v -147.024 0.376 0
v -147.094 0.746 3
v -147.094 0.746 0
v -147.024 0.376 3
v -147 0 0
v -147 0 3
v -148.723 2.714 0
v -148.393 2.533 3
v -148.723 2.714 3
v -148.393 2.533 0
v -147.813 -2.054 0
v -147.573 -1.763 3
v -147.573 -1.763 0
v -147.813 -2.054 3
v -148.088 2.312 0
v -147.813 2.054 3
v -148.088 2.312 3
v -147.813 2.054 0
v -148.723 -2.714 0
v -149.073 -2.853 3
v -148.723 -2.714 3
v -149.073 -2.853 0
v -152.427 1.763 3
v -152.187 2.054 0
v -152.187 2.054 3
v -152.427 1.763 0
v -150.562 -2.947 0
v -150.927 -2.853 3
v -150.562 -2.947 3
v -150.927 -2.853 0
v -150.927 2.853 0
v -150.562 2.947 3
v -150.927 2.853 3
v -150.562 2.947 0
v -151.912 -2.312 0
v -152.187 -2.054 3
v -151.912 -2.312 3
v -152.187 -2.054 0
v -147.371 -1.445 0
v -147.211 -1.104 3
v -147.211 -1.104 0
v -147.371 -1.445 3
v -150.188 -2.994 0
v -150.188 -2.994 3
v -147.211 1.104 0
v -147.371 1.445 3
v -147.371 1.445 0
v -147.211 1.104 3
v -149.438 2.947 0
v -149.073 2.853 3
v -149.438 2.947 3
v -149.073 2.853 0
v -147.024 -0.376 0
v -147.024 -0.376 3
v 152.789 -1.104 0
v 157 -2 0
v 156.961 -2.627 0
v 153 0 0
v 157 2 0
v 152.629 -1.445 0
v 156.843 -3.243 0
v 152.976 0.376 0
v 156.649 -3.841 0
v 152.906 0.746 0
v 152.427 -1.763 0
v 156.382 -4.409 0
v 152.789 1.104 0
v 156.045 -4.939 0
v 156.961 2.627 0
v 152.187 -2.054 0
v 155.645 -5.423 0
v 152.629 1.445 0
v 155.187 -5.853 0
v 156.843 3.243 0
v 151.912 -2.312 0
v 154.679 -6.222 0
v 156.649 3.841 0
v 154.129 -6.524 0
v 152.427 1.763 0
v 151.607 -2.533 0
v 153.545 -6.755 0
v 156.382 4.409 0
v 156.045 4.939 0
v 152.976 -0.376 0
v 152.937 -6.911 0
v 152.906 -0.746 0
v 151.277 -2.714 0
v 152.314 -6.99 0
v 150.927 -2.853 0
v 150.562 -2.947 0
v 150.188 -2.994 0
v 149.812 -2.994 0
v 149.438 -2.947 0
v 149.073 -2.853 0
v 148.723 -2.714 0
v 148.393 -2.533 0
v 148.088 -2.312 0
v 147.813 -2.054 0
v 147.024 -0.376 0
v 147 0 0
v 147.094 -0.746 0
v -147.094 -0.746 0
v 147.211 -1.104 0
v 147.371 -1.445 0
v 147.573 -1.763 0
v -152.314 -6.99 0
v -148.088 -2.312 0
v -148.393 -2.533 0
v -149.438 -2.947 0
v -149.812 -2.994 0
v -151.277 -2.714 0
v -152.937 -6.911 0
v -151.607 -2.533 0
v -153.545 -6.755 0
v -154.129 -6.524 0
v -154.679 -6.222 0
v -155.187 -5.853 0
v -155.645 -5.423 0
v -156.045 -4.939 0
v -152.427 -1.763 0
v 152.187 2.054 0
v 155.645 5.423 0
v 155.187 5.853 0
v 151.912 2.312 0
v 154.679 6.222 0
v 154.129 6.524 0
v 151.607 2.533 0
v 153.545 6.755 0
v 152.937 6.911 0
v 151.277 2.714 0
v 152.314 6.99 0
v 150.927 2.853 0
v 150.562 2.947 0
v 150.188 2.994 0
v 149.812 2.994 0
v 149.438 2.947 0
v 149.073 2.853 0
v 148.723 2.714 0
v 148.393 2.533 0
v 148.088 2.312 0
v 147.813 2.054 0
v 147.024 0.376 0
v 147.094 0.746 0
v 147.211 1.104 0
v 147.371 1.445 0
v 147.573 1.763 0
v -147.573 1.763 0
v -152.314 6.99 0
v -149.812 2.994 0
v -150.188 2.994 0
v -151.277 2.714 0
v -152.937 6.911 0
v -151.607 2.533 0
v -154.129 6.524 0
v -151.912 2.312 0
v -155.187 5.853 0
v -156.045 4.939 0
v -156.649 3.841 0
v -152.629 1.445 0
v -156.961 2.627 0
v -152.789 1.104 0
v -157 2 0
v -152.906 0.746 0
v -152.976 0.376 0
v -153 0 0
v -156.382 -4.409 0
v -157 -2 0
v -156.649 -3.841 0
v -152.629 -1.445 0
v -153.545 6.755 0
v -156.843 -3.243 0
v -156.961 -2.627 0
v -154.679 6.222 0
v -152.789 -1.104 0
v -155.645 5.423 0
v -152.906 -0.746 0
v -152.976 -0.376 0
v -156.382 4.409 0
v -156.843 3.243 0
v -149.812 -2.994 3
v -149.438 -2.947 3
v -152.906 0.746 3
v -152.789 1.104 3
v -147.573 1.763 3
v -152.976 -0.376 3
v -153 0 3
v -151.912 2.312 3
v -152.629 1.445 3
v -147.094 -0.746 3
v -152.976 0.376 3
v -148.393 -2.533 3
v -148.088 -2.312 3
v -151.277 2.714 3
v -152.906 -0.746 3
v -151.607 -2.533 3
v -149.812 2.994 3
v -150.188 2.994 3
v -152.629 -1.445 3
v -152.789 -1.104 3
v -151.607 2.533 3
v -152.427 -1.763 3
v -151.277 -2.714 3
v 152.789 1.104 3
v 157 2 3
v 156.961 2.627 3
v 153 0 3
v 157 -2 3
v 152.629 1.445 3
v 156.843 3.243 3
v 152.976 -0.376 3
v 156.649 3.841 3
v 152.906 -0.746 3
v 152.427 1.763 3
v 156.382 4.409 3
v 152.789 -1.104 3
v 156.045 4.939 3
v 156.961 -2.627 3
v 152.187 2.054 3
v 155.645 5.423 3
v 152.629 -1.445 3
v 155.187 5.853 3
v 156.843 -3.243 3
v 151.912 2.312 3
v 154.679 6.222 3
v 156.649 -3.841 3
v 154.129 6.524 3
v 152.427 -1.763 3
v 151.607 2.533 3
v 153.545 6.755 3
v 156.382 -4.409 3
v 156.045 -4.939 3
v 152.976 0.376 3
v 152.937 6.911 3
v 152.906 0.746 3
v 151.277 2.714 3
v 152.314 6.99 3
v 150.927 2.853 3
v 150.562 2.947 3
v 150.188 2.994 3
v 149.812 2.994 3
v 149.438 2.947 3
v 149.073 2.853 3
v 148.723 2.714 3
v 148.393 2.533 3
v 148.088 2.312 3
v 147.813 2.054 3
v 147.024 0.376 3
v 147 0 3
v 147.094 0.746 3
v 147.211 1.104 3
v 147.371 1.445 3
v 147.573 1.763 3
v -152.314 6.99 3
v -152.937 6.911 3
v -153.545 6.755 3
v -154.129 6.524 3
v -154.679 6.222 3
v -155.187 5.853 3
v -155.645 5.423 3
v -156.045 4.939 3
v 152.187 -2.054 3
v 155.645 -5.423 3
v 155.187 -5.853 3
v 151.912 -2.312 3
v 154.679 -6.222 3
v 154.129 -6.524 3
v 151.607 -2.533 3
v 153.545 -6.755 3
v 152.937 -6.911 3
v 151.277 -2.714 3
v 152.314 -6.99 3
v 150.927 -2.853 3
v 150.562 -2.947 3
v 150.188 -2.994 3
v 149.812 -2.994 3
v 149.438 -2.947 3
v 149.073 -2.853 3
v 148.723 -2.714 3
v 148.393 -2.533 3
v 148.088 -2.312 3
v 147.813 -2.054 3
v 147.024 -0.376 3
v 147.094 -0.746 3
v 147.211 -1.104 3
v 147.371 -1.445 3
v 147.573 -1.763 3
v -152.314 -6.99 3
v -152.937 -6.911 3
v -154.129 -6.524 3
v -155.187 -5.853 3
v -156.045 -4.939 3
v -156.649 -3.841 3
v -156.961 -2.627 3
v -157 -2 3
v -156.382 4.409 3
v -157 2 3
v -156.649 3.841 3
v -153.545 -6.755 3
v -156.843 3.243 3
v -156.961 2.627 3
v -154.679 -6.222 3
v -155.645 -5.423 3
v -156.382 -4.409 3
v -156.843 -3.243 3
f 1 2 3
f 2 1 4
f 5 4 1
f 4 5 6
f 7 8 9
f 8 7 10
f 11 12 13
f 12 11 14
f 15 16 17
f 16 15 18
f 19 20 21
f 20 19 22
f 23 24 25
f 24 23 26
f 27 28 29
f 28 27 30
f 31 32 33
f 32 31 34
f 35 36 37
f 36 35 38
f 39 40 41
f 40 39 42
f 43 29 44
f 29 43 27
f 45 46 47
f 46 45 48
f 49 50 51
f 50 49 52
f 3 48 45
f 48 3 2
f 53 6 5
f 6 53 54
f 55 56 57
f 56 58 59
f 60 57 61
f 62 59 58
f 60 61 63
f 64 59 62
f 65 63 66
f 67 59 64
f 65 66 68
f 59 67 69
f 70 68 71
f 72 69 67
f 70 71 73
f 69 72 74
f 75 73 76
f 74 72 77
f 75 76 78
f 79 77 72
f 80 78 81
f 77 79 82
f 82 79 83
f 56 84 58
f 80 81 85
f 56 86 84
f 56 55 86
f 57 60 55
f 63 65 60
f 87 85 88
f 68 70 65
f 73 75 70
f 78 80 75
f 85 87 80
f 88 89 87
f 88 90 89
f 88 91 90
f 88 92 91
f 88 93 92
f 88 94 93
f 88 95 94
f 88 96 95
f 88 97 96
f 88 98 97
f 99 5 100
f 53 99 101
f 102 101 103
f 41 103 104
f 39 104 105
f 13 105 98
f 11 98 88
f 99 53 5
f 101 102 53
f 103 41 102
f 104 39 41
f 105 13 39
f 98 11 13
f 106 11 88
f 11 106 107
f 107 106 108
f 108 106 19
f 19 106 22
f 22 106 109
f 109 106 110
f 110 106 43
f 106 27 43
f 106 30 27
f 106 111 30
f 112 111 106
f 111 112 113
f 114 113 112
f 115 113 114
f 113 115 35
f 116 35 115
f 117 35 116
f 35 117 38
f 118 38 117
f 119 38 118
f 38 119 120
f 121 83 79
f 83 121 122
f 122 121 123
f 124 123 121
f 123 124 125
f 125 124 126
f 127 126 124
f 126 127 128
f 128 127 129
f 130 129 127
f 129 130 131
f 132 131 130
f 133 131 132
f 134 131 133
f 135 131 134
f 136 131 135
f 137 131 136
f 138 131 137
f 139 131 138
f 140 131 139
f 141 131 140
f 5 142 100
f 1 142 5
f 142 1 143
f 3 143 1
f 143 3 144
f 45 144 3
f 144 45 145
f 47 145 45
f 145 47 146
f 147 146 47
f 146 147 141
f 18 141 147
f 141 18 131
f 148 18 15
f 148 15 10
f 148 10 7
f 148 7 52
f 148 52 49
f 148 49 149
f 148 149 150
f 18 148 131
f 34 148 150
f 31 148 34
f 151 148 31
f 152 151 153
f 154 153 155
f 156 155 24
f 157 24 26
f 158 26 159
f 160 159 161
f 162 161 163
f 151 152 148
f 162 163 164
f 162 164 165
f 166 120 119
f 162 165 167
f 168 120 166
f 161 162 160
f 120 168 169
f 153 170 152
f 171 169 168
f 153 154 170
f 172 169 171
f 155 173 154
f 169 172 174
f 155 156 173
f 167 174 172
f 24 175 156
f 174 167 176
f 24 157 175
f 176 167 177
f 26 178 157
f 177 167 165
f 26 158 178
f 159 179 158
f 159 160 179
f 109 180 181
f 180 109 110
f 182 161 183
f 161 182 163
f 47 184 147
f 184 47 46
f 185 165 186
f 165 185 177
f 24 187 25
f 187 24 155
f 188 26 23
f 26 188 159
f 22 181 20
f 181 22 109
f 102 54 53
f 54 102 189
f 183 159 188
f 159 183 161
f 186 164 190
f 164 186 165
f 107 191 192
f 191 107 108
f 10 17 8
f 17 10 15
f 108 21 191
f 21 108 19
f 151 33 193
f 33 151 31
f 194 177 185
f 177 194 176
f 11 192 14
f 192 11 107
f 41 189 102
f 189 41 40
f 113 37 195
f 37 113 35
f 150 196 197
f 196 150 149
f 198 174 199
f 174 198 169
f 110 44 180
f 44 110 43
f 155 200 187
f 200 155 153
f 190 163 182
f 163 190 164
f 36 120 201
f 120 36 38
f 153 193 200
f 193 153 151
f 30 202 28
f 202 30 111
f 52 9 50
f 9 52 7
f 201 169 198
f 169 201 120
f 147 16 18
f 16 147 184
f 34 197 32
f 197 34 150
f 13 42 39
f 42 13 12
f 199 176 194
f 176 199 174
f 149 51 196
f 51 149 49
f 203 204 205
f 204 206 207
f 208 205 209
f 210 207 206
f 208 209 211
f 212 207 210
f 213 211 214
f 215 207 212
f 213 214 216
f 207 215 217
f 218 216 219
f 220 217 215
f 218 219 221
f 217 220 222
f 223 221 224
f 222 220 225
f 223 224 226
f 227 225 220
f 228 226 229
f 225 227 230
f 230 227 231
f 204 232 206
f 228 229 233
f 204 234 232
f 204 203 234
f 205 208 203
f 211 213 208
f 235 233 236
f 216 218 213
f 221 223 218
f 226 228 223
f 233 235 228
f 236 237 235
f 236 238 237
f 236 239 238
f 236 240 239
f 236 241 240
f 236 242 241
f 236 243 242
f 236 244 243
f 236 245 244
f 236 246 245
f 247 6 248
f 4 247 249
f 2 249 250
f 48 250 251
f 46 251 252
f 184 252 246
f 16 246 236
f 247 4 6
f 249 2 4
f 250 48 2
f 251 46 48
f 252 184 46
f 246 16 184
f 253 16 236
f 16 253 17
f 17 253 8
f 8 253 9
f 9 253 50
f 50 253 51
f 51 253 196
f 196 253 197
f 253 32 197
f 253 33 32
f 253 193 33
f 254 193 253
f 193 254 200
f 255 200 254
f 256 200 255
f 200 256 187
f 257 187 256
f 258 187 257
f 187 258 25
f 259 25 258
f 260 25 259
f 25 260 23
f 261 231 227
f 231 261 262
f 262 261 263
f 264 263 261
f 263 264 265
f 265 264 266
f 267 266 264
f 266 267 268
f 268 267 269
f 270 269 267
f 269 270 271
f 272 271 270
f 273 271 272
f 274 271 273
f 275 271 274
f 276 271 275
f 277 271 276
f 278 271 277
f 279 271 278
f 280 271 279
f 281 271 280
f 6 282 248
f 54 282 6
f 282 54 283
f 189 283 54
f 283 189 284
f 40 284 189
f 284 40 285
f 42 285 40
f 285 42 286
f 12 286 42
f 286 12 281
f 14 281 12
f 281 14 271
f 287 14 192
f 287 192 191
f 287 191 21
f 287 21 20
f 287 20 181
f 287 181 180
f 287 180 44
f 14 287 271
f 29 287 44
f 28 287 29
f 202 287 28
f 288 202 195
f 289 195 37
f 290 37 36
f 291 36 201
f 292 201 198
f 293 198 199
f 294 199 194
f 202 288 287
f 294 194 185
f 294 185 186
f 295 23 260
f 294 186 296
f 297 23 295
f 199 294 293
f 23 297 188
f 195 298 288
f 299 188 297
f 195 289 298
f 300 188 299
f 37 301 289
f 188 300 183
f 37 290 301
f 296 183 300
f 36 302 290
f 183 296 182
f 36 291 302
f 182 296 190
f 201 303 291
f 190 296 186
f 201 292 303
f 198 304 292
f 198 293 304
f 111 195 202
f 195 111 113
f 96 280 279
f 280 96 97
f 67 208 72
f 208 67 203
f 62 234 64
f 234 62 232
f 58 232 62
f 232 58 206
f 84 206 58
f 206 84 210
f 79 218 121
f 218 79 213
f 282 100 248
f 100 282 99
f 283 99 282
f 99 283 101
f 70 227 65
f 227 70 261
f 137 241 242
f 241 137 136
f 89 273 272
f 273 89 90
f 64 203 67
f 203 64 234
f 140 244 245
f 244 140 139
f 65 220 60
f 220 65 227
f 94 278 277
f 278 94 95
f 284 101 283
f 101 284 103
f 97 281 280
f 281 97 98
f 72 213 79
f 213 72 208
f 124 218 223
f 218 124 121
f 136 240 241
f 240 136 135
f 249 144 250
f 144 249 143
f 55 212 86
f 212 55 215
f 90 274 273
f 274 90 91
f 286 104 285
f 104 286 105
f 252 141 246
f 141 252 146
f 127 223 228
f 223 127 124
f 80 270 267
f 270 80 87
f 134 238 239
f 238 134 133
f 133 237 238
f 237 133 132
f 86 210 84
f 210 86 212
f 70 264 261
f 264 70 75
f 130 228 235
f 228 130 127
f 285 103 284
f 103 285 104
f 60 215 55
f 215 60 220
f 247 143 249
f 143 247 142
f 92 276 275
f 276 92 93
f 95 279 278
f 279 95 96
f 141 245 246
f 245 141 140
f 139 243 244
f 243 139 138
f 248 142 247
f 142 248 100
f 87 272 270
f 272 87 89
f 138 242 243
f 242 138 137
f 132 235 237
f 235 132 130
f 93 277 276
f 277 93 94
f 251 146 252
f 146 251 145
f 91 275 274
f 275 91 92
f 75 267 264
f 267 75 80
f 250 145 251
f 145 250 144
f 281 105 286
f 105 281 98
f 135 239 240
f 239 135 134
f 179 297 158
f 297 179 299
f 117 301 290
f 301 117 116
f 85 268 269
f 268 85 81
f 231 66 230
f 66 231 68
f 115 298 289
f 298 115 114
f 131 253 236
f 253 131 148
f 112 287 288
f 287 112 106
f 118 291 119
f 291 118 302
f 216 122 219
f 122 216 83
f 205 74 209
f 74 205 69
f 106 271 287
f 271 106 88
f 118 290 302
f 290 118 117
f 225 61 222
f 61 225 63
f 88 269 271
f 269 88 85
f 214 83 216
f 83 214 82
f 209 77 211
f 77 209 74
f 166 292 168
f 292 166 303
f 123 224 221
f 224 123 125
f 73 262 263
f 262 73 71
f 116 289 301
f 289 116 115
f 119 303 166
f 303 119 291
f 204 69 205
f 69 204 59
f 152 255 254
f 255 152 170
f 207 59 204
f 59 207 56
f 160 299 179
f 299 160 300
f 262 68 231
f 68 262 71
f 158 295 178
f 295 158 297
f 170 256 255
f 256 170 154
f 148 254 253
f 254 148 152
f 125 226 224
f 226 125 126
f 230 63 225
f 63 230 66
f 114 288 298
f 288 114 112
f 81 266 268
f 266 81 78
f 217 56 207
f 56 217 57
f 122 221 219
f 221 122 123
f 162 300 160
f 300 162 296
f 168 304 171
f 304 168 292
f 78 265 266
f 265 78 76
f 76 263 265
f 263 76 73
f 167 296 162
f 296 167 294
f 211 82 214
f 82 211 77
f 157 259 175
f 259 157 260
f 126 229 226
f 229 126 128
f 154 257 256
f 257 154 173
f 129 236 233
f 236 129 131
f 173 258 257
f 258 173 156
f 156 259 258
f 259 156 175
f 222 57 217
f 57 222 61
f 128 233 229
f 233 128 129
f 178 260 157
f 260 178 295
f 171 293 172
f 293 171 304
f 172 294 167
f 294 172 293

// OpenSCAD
$fn = 50;


difference() {
	union() {
		hull() {
			translate(v = [-152.0000000000, 2.0000000000, 0]) {
				cylinder(h = 3, r = 5);
			}
			translate(v = [152.0000000000, 2.0000000000, 0]) {
				cylinder(h = 3, r = 5);
			}
			translate(v = [-152.0000000000, -2.0000000000, 0]) {
				cylinder(h = 3, r = 5);
			}
			translate(v = [152.0000000000, -2.0000000000, 0]) {
				cylinder(h = 3, r = 5);
			}
		}
	}
	union() {
		translate(v = [-150.0000000000, 0.0000000000, 0]) {
			cylinder(h = 3, r = 3.0000000000);
		}
		translate(v = [150.0000000000, 0.0000000000, 0]) {
			cylinder(h = 3, r = 3.0000000000);
		}
		translate(v = [-150.0000000000, 0.0000000000, 0]) {
			cylinder(h = 3, r = 1.5000000000);
		}
		translate(v = [150.0000000000, 0.0000000000, 0]) {
			cylinder(h = 3, r = 1.5000000000);
		}
		translate(v = [-150.0000000000, 0.0000000000, 0]) {
			cylinder(h = 3, r = 1.5000000000);
		}
		translate(v = [150.0000000000, 0.0000000000, 0]) {
			cylinder(h = 3, r = 1.5000000000);
		}
		translate(v = [-150.0000000000, 0.0000000000, 0]) {
			cylinder(h = 3, r = 1.5000000000);
		}
		translate(v = [150.0000000000, 0.0000000000, 0]) {
			cylinder(h = 3, r = 1.5000000000);
		}
	}
}
